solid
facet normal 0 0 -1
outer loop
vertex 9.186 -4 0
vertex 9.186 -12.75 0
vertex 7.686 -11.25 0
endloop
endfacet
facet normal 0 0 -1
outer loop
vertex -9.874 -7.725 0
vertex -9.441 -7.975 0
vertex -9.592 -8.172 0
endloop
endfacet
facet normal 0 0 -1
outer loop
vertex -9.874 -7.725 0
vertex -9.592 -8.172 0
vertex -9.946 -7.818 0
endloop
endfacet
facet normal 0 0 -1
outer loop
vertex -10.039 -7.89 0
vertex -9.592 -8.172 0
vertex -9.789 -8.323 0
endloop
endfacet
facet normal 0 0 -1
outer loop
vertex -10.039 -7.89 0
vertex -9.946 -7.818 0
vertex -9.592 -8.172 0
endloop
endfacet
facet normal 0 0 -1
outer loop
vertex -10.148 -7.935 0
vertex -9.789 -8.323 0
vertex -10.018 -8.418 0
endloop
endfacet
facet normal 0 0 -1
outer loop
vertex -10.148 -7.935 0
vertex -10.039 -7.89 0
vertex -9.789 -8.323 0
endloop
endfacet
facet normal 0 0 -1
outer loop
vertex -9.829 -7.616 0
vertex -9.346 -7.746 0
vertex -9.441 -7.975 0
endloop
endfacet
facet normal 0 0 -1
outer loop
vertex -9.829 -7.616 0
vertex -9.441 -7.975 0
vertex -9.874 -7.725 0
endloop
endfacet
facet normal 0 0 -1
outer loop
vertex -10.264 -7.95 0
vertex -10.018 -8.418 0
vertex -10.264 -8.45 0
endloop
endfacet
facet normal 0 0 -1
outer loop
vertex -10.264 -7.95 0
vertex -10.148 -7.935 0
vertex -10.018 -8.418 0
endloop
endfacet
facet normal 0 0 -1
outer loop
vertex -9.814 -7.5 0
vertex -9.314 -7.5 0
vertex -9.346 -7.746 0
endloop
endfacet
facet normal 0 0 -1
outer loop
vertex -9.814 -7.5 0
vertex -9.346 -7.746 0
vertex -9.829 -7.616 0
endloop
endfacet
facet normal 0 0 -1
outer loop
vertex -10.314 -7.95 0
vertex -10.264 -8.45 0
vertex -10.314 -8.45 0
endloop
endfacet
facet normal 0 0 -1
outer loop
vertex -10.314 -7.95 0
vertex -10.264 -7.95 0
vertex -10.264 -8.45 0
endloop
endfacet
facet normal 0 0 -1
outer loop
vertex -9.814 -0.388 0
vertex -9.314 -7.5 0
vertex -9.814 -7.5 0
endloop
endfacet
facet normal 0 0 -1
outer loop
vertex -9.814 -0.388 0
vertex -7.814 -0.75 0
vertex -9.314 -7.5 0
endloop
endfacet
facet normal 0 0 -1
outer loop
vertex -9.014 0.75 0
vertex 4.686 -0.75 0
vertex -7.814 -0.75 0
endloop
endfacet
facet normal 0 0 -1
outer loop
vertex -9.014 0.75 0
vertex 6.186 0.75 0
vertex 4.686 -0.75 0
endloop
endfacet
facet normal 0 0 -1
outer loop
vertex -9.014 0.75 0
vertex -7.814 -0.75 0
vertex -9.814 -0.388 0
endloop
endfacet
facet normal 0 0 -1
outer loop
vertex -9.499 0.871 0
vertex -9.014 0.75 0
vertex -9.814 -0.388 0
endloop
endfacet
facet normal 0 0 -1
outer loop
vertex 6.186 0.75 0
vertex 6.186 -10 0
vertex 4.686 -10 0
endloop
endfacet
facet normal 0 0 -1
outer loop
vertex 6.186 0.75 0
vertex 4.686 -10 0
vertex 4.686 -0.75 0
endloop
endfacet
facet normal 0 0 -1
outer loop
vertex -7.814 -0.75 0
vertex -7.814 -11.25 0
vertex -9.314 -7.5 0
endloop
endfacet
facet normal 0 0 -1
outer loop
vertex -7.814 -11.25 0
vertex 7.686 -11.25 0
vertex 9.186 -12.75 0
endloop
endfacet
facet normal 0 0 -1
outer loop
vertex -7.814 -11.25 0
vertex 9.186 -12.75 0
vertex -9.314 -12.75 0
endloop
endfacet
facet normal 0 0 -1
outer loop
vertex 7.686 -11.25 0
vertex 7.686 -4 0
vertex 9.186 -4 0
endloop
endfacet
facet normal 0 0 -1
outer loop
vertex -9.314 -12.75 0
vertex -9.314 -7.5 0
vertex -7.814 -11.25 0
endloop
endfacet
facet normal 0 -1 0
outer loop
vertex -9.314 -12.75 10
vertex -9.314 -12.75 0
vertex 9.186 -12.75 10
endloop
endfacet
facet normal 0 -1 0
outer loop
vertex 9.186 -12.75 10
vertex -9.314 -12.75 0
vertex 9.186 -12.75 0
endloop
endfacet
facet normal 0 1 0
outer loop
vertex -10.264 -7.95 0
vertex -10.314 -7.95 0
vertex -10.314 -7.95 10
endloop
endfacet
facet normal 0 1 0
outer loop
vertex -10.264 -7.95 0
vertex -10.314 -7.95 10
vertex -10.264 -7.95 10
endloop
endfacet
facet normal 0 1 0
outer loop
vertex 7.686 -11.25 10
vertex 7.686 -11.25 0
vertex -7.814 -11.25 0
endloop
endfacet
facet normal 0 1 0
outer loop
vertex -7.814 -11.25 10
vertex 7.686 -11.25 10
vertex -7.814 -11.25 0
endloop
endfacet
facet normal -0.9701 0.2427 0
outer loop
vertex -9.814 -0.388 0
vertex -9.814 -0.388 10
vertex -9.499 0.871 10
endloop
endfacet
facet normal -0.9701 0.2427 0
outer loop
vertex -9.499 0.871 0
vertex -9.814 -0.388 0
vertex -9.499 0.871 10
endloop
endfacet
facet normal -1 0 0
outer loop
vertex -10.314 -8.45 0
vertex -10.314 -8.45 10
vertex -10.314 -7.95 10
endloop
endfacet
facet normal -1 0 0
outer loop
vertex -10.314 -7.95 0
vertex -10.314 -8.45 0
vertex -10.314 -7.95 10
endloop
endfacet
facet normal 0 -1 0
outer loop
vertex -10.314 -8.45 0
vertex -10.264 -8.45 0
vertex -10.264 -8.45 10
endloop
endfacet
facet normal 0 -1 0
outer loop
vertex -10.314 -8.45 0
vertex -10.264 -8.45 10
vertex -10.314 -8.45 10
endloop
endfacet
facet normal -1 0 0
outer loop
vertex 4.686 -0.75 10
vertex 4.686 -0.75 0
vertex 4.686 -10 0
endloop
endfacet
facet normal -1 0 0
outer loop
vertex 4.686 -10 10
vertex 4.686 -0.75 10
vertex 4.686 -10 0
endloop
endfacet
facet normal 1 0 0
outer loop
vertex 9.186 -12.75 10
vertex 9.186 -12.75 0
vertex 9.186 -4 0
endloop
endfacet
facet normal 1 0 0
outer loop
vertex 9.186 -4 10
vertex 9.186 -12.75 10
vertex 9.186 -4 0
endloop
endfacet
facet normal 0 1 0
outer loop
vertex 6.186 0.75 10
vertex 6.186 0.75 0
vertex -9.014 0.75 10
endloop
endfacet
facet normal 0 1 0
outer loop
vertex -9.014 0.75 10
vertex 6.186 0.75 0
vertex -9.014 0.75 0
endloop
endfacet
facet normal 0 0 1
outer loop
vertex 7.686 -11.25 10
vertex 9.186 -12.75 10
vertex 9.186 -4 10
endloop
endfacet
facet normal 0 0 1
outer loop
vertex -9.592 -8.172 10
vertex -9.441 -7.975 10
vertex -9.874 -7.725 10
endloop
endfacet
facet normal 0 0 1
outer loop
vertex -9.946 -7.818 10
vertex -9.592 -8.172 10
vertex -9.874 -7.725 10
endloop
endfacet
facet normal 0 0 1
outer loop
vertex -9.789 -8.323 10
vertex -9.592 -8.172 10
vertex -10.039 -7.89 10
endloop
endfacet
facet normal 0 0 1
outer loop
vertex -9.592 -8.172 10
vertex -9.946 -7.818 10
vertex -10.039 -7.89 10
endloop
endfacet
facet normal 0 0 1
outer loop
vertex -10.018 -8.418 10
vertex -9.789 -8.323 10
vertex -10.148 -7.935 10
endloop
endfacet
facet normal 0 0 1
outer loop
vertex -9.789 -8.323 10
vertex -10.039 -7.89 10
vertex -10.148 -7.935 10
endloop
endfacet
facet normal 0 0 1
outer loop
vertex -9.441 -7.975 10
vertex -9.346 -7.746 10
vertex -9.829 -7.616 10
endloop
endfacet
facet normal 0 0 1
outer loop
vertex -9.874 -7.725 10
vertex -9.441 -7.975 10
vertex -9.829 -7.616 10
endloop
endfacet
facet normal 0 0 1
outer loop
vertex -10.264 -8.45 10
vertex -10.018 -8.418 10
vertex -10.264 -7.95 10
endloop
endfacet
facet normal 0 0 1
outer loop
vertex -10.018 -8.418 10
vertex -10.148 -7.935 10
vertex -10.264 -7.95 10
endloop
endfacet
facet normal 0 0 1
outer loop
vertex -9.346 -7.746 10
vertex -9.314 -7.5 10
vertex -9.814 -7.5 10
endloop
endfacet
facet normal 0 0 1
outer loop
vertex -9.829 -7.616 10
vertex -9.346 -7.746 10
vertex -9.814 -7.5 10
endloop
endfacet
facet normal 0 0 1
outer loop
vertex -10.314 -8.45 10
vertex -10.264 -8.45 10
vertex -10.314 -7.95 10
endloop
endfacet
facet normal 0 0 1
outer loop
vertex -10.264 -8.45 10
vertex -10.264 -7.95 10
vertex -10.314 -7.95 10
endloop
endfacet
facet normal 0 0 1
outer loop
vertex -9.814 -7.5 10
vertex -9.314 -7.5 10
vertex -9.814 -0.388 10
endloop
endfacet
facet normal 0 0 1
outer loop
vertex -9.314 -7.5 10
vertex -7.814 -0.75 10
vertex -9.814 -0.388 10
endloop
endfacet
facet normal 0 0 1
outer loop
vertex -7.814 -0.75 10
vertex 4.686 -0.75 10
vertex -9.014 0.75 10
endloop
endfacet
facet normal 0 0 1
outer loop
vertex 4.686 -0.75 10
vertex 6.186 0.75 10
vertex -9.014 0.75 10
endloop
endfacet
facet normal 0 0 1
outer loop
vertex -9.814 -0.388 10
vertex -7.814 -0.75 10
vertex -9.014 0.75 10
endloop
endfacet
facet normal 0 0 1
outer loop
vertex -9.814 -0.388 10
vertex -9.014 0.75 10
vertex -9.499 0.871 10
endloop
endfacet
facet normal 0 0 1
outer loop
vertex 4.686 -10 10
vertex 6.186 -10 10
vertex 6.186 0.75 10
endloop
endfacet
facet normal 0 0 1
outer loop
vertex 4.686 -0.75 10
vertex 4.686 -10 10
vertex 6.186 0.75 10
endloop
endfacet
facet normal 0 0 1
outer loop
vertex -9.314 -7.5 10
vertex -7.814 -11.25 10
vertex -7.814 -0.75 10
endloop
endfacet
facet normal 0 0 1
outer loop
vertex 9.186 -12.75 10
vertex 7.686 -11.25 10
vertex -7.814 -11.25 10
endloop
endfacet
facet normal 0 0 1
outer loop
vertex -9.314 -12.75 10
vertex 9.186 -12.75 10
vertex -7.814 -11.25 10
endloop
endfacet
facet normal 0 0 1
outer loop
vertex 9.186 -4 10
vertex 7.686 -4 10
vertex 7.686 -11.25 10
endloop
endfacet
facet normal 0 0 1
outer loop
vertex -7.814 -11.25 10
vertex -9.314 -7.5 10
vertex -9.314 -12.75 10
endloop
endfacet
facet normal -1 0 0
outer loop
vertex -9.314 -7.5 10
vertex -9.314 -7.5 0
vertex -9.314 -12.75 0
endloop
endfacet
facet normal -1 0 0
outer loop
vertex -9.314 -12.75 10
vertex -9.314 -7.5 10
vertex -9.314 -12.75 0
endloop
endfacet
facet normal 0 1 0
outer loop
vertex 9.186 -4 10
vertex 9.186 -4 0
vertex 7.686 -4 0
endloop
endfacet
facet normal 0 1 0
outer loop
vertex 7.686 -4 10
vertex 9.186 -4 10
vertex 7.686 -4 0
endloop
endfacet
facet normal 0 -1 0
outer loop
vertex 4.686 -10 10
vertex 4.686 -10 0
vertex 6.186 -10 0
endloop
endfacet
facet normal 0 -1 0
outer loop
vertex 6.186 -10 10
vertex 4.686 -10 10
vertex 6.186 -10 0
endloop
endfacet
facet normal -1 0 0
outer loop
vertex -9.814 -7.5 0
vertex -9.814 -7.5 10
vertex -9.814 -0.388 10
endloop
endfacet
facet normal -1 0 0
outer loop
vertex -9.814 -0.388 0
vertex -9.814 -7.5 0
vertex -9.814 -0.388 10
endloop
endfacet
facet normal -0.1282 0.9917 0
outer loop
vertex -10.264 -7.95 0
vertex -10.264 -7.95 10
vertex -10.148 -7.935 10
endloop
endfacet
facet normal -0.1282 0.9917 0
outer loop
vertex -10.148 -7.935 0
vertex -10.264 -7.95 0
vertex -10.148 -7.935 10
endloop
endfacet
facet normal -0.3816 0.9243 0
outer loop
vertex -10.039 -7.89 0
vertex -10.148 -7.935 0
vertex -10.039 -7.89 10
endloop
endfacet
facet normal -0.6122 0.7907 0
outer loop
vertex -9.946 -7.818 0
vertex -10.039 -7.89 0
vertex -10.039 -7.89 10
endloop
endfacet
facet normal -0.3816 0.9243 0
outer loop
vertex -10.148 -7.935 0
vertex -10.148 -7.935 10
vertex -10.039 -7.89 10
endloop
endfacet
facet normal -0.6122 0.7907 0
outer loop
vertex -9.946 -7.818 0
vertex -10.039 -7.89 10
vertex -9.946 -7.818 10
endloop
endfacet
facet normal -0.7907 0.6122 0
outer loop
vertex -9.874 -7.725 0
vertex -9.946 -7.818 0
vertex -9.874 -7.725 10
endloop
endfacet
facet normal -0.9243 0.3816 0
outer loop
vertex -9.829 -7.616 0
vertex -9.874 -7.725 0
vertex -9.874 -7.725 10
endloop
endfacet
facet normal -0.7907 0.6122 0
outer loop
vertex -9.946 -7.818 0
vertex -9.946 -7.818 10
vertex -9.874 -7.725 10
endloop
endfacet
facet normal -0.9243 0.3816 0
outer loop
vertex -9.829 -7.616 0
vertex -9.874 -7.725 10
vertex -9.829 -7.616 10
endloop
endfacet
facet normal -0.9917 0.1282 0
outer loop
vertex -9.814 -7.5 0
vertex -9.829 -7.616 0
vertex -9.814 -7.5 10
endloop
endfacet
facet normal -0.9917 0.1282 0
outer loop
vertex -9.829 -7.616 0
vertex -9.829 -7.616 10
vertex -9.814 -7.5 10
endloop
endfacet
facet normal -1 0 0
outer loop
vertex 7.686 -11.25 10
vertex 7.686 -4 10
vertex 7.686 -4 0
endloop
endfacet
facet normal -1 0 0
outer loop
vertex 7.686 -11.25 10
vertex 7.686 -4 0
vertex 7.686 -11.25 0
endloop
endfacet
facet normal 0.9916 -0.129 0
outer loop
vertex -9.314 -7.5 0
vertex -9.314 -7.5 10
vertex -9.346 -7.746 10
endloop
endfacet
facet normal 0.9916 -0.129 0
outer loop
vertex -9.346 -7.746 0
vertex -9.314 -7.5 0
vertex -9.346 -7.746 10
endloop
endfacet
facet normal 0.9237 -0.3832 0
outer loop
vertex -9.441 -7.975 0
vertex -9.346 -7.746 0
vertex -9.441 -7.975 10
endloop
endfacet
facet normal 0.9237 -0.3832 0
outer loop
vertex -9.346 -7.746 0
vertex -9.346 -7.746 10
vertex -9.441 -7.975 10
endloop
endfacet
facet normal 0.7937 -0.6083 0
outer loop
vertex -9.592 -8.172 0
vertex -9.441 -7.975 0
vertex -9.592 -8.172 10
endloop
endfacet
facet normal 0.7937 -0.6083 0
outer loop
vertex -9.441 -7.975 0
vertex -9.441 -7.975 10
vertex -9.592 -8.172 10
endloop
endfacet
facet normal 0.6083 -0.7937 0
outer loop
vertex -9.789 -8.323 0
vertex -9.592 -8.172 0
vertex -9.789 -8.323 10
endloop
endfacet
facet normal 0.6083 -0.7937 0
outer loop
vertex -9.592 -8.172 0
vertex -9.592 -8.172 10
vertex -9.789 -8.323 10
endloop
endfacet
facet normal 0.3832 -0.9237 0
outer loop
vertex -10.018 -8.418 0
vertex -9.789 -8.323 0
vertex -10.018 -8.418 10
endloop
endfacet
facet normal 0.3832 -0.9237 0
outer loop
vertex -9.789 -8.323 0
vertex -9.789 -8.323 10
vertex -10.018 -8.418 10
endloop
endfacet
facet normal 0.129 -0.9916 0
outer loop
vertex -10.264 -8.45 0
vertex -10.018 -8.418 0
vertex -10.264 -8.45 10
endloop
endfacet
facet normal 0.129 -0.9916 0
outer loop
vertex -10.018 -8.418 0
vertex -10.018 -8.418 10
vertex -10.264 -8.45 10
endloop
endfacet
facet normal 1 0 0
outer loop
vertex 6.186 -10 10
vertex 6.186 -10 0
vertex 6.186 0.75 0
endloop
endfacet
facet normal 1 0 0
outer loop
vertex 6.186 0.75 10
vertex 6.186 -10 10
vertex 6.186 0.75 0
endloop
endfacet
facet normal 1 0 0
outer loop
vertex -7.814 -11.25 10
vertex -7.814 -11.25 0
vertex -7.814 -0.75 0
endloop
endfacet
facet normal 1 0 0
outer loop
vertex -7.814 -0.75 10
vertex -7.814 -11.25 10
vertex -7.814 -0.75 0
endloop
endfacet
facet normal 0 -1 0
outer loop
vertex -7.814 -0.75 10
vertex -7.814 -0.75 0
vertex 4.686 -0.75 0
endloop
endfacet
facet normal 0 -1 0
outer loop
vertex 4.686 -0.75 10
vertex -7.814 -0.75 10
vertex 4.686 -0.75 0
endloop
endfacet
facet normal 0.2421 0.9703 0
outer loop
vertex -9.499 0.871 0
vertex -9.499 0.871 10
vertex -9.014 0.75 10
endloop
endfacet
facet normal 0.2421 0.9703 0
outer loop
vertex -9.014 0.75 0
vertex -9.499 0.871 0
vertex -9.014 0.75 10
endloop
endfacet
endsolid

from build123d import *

# Parameters (mm, degrees)
EXTRUDE_THIN1_DEPTH = 10
EXTRUDE_THIN2_DEPTH = 10


# Read off the part's stored shape, not the designer's step: Extrude-Thin1
with BuildPart() as part:
    # Extrude-Thin1 outline → Extrude-Thin1 (new body)
    with BuildSketch(Plane.XY):
        Polygon((-9.314102564, -0.45), (-9.314102564, -12.75), (9.185897436, -12.75), (9.185897436, -4), (7.685897436, -4), (7.685897436, -11.25), (-7.814102564, -11.25), (-7.814102564, -0.75), (4.685897436, -0.75), (4.685897436, -10), (6.185897436, -10), (6.185897436, 0.75), (-9.014102564, 0.75), align=None)
    extrude(amount=EXTRUDE_THIN1_DEPTH)

    # Sketch2 → Extrude-Thin2 (add)
    with BuildSketch(Plane.XY.offset(10)):
        with BuildLine():
            Line((-9.014102564, 0.75), (-9.314102564, -0.45))
            Line((-9.314102564, -0.45), (-9.314102564, -7.5))
            ThreePointArc((-9.314102564, -7.5), (-9.592351122, -8.171751442), (-10.264102564, -8.45))
            Line((-10.264102564, -8.45), (-10.314102564, -8.45))
            Line((-10.314102564, -8.45), (-10.314102564, -7.95))
            Line((-10.314102564, -7.95), (-10.264102564, -7.95))
            ThreePointArc((-10.264102564, -7.95), (-9.945904513, -7.818198052), (-9.814102564, -7.5))
            Line((-9.814102564, -7.5), (-9.814102564, -0.388447187))
            Line((-9.814102564, -0.388447187), (-9.499173814, 0.871267813))
            Line((-9.499173814, 0.871267813), (-9.014102564, 0.75))
        make_face()
    extrude(amount=-EXTRUDE_THIN2_DEPTH)


solid = part.part
